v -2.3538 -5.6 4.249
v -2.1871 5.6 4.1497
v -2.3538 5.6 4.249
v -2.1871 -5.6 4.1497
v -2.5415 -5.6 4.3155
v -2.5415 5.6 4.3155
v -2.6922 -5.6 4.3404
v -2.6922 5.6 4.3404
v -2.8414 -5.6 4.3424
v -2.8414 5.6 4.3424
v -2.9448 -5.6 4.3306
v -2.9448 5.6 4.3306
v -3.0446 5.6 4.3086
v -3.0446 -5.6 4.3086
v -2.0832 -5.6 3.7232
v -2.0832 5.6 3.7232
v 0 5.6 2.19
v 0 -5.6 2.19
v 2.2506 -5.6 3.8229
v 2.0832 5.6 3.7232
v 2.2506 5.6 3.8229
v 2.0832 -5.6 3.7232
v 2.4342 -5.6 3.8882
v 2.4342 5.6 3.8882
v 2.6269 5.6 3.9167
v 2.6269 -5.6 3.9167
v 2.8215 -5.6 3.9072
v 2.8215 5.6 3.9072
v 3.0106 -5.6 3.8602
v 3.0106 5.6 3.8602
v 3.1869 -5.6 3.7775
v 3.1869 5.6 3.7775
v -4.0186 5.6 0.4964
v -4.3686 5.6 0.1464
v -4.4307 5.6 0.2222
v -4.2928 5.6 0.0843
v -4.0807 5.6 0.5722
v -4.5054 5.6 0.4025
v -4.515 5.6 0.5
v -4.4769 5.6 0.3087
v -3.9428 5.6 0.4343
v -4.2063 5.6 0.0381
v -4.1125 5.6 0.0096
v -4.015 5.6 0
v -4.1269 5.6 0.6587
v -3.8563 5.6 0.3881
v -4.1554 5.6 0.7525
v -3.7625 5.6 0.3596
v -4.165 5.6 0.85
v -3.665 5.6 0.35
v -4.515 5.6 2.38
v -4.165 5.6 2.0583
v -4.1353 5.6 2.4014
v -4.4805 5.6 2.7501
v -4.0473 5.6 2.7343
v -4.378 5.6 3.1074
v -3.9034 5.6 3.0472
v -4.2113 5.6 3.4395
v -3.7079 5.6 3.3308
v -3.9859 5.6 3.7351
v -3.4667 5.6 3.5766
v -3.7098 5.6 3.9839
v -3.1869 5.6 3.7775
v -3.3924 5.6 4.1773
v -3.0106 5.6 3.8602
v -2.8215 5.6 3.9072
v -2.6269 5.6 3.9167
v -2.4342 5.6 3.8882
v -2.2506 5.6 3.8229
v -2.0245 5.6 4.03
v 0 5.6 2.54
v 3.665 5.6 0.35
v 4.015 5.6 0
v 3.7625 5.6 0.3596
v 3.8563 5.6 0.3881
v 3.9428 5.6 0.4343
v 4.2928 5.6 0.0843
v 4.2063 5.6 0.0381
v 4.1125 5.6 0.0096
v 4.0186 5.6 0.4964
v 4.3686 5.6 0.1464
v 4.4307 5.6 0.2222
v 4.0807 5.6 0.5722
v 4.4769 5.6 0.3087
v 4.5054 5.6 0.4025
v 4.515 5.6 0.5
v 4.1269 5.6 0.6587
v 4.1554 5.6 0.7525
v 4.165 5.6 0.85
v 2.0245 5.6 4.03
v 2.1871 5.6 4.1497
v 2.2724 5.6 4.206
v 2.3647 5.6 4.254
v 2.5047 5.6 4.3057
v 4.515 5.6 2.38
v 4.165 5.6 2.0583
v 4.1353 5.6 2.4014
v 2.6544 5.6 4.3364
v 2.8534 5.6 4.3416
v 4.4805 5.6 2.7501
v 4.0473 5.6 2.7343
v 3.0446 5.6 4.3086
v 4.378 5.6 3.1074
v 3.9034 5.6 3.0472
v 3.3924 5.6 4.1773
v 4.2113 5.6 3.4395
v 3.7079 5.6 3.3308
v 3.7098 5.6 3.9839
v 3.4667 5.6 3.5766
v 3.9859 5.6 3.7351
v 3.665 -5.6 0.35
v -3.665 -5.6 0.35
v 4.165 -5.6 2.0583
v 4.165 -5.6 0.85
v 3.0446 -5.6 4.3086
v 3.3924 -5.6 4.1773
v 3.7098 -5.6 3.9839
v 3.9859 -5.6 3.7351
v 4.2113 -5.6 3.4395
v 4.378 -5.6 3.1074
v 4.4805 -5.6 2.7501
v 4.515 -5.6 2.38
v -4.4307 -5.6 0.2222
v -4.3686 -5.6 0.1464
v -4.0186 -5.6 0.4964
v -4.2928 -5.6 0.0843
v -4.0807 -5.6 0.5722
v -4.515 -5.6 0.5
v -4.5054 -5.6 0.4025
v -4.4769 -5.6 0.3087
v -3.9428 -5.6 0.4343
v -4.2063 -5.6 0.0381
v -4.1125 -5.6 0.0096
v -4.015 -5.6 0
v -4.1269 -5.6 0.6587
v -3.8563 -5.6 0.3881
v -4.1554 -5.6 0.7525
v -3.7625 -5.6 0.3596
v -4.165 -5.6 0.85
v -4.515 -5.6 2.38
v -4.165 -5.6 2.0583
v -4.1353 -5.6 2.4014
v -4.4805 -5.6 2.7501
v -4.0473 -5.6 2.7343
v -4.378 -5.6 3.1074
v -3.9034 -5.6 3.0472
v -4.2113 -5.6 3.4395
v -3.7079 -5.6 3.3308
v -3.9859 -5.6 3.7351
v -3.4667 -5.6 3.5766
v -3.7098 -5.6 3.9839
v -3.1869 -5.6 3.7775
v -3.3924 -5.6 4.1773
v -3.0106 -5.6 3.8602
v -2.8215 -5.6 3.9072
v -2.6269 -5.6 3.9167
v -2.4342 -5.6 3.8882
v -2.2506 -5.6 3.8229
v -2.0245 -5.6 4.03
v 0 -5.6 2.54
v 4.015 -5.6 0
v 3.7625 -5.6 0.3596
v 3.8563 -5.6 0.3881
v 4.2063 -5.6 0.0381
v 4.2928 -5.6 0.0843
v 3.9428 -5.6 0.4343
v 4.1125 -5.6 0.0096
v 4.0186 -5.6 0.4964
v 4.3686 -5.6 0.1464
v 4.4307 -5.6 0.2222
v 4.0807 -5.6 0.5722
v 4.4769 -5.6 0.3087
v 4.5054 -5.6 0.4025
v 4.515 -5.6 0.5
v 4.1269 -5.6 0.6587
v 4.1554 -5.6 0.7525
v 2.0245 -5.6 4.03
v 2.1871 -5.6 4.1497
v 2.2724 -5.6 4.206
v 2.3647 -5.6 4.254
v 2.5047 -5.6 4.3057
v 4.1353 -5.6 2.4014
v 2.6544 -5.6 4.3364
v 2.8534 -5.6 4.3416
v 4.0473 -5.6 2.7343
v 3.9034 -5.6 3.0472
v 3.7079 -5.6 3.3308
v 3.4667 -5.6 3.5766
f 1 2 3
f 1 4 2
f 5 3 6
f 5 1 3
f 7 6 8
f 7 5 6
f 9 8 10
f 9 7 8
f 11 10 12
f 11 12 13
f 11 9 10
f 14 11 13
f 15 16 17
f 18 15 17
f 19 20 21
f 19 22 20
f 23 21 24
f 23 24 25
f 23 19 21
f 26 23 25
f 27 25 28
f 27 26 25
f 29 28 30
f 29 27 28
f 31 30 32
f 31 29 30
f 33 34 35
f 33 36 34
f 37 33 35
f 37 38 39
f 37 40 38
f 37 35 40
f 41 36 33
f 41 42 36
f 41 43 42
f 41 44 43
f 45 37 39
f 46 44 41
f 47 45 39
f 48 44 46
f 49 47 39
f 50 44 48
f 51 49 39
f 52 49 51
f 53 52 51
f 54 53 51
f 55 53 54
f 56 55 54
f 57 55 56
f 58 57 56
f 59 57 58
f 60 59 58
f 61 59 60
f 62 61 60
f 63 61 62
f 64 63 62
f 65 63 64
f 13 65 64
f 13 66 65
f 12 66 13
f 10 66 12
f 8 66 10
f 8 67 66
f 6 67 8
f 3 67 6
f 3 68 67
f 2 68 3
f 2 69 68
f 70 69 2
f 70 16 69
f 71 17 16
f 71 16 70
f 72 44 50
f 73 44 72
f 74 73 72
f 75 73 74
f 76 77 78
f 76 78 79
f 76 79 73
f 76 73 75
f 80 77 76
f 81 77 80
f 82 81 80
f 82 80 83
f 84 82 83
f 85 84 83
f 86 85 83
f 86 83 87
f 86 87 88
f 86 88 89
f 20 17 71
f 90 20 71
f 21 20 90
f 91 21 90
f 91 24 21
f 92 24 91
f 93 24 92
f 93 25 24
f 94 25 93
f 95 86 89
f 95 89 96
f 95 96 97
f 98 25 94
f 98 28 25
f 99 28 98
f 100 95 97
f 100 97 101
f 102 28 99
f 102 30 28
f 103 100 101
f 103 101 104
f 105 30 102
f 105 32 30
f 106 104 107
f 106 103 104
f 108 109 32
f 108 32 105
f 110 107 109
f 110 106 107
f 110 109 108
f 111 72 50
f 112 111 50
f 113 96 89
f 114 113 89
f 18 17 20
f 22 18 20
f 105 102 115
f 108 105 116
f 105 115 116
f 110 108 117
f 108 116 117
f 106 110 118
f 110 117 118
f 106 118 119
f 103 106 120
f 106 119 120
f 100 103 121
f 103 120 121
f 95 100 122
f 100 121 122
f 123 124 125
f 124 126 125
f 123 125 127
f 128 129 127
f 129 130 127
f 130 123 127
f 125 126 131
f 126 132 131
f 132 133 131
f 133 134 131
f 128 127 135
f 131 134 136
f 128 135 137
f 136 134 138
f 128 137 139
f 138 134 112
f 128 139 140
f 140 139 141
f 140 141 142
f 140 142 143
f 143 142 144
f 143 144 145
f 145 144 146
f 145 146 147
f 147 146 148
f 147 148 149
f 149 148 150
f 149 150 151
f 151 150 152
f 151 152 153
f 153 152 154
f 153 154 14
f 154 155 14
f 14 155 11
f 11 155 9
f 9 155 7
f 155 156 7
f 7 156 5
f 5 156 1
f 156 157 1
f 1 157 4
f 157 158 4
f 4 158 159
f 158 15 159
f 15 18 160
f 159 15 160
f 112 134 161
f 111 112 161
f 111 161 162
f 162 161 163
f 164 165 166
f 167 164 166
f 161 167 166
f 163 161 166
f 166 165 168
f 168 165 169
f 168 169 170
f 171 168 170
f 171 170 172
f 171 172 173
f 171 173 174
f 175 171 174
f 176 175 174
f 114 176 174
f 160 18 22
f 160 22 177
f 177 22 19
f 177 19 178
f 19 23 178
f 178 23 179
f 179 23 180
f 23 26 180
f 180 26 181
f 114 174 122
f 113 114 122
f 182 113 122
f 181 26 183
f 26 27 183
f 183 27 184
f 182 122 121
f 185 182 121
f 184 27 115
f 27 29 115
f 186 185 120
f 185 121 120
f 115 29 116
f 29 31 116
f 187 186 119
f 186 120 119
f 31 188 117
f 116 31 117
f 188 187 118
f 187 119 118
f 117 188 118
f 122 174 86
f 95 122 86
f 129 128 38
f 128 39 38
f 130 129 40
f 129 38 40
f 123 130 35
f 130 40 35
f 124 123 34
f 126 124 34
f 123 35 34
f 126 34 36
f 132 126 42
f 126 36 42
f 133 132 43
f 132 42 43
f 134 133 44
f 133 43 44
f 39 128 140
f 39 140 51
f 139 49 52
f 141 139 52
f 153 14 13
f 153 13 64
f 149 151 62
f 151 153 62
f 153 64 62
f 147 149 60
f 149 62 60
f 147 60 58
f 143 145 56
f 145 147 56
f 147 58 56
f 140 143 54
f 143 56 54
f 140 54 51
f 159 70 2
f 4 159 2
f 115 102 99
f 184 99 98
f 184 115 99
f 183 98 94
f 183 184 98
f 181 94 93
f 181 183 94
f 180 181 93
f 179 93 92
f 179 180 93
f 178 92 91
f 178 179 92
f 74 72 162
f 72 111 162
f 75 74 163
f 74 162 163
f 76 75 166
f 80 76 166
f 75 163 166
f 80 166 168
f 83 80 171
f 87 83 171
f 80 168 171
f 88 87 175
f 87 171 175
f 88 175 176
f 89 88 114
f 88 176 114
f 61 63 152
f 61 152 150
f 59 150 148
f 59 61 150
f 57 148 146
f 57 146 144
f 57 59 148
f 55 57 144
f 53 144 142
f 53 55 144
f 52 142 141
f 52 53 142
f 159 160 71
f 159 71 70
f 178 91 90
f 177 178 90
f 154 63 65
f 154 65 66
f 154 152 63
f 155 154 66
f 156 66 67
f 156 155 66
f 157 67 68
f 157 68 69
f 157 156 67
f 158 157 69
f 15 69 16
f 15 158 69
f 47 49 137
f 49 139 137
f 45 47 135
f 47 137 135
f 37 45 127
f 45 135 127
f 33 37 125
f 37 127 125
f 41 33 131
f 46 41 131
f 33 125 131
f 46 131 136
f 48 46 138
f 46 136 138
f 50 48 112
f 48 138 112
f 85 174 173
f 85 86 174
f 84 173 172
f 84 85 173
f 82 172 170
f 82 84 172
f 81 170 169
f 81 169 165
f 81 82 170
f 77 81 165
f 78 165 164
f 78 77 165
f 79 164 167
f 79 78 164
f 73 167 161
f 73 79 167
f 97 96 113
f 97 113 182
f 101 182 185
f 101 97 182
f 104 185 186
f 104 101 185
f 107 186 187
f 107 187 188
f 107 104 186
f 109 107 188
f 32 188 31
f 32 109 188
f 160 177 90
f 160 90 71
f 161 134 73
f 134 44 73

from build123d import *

# Parameters (mm, degrees)
SKETCH_1_W          = 9.03
SKETCH_1_H          = 11.2
EXTRUDE_1_DEPTH     = 4.38
FILLET_1_R          = 0.5
CUT_EXTRUDE_2_DEPTH = 14.38
FILLET_5_R          = 2
FILLET_6_R          = 1
FILLET_7_R          = 0.5


with BuildPart() as part:
    # 스케치1 → 보스-돌출1 (new body)
    with BuildSketch(Plane.XY):
        Rectangle(SKETCH_1_W, SKETCH_1_H)
    extrude(amount=EXTRUDE_1_DEPTH)

    # 필렛1
    fillet_1_edges = [part.edges().sort_by_distance(p)[0] for p in [
        (-4.515, 0, 0),
        (4.515, 0, 0),
    ]]
    fillet(fillet_1_edges, radius=FILLET_1_R)

    # 스케치2 → 컷-돌출2 (cut)
    with BuildSketch(Plane(origin=(0, 5.6, 0), x_dir=(1, 0, 0), z_dir=(0, 1, 0))):
        Polygon((4.165, -4.03), (4.165, -0.35), (-4.165, -0.35), (-4.165, -4.03), (-2.5, -4.03), (0, -2.19), (2.5, -4.03), align=None)
        Polygon((2.5, -4.38), (2.024456522, -4.03), (-2.024456522, -4.03), (-2.5, -4.38), align=None)
        Polygon((-2.024456522, -4.03), (2.024456522, -4.03), (0, -2.54), align=None)
    extrude(amount=-CUT_EXTRUDE_2_DEPTH, mode=Mode.SUBTRACT)

    # 필렛5
    # the kernel refuses this fillet: 2 mm, written as the material it adds along each edge
    with BuildSketch(Plane(origin=(4.165, 5.6, 4.03), x_dir=(-1, 0, 0), z_dir=(0, -1, 0))) as fillet_5_piece_1:
        with BuildLine():
            CenterArc((2, 1.971744152), FILLET_5_R, 180, 80.357504536)
            Line((0, 1.971744152), (0, 0))
            Line((0, 0), (1.665, 0))
        make_face()
    extrude(amount=11.2)
    with BuildSketch(Plane(origin=(-4.165, 5.6, 4.03), x_dir=(0, 0, -1), z_dir=(0, -1, 0))) as fillet_5_piece_2:
        with BuildLine():
            CenterArc((1.971744152, 2), FILLET_5_R, 189.642495464, 80.357504536)
            Line((0, 1.665), (0, 0))
            Line((0, 0), (1.971744152, 0))
        make_face()
    extrude(amount=11.2)
    # the kernel refuses this fillet: 2 mm, written as the material it takes off along each edge
    with BuildSketch(Plane(origin=(4.515, -10.6, 4.38), x_dir=(0, 0, -1), z_dir=(0, 1, 0))) as fillet_5_2_piece_1:
        with BuildLine():
            CenterArc((FILLET_5_R, FILLET_5_R), FILLET_5_R, 180, 90)
            Line((0, FILLET_5_R), (0, 0))
            Line((0, 0), (FILLET_5_R, 0))
        make_face()
    extrude(amount=21.2, mode=Mode.SUBTRACT)
    with BuildSketch(Plane(origin=(-4.515, 10.6, 4.38), x_dir=(1, 0, 0), z_dir=(0, -1, 0))) as fillet_5_2_piece_2:
        with BuildLine():
            CenterArc((FILLET_5_R, -FILLET_5_R), FILLET_5_R, 90, 90)
            Line((0, -FILLET_5_R), (0, 0))
            Line((0, 0), (FILLET_5_R, 0))
        make_face()
    extrude(amount=21.2, mode=Mode.SUBTRACT)

    # 필렛6
    fillet_6_edges = [part.edges().sort_by_distance(p)[0] for p in [
        (2.5, 0, 4.03),
        (2.5, 0, 4.38),
        (-2.5, 0, 4.38),
        (-2.5, 0, 4.03),
    ]]
    fillet(fillet_6_edges, radius=FILLET_6_R)

    # 필렛7
    fillet_7_edges = [part.edges().sort_by_distance(p)[0] for p in [
        (-4.165, 0, 0.35),
        (4.165, 0, 0.35),
    ]]
    fillet(fillet_7_edges, radius=FILLET_7_R)


solid = part.part
